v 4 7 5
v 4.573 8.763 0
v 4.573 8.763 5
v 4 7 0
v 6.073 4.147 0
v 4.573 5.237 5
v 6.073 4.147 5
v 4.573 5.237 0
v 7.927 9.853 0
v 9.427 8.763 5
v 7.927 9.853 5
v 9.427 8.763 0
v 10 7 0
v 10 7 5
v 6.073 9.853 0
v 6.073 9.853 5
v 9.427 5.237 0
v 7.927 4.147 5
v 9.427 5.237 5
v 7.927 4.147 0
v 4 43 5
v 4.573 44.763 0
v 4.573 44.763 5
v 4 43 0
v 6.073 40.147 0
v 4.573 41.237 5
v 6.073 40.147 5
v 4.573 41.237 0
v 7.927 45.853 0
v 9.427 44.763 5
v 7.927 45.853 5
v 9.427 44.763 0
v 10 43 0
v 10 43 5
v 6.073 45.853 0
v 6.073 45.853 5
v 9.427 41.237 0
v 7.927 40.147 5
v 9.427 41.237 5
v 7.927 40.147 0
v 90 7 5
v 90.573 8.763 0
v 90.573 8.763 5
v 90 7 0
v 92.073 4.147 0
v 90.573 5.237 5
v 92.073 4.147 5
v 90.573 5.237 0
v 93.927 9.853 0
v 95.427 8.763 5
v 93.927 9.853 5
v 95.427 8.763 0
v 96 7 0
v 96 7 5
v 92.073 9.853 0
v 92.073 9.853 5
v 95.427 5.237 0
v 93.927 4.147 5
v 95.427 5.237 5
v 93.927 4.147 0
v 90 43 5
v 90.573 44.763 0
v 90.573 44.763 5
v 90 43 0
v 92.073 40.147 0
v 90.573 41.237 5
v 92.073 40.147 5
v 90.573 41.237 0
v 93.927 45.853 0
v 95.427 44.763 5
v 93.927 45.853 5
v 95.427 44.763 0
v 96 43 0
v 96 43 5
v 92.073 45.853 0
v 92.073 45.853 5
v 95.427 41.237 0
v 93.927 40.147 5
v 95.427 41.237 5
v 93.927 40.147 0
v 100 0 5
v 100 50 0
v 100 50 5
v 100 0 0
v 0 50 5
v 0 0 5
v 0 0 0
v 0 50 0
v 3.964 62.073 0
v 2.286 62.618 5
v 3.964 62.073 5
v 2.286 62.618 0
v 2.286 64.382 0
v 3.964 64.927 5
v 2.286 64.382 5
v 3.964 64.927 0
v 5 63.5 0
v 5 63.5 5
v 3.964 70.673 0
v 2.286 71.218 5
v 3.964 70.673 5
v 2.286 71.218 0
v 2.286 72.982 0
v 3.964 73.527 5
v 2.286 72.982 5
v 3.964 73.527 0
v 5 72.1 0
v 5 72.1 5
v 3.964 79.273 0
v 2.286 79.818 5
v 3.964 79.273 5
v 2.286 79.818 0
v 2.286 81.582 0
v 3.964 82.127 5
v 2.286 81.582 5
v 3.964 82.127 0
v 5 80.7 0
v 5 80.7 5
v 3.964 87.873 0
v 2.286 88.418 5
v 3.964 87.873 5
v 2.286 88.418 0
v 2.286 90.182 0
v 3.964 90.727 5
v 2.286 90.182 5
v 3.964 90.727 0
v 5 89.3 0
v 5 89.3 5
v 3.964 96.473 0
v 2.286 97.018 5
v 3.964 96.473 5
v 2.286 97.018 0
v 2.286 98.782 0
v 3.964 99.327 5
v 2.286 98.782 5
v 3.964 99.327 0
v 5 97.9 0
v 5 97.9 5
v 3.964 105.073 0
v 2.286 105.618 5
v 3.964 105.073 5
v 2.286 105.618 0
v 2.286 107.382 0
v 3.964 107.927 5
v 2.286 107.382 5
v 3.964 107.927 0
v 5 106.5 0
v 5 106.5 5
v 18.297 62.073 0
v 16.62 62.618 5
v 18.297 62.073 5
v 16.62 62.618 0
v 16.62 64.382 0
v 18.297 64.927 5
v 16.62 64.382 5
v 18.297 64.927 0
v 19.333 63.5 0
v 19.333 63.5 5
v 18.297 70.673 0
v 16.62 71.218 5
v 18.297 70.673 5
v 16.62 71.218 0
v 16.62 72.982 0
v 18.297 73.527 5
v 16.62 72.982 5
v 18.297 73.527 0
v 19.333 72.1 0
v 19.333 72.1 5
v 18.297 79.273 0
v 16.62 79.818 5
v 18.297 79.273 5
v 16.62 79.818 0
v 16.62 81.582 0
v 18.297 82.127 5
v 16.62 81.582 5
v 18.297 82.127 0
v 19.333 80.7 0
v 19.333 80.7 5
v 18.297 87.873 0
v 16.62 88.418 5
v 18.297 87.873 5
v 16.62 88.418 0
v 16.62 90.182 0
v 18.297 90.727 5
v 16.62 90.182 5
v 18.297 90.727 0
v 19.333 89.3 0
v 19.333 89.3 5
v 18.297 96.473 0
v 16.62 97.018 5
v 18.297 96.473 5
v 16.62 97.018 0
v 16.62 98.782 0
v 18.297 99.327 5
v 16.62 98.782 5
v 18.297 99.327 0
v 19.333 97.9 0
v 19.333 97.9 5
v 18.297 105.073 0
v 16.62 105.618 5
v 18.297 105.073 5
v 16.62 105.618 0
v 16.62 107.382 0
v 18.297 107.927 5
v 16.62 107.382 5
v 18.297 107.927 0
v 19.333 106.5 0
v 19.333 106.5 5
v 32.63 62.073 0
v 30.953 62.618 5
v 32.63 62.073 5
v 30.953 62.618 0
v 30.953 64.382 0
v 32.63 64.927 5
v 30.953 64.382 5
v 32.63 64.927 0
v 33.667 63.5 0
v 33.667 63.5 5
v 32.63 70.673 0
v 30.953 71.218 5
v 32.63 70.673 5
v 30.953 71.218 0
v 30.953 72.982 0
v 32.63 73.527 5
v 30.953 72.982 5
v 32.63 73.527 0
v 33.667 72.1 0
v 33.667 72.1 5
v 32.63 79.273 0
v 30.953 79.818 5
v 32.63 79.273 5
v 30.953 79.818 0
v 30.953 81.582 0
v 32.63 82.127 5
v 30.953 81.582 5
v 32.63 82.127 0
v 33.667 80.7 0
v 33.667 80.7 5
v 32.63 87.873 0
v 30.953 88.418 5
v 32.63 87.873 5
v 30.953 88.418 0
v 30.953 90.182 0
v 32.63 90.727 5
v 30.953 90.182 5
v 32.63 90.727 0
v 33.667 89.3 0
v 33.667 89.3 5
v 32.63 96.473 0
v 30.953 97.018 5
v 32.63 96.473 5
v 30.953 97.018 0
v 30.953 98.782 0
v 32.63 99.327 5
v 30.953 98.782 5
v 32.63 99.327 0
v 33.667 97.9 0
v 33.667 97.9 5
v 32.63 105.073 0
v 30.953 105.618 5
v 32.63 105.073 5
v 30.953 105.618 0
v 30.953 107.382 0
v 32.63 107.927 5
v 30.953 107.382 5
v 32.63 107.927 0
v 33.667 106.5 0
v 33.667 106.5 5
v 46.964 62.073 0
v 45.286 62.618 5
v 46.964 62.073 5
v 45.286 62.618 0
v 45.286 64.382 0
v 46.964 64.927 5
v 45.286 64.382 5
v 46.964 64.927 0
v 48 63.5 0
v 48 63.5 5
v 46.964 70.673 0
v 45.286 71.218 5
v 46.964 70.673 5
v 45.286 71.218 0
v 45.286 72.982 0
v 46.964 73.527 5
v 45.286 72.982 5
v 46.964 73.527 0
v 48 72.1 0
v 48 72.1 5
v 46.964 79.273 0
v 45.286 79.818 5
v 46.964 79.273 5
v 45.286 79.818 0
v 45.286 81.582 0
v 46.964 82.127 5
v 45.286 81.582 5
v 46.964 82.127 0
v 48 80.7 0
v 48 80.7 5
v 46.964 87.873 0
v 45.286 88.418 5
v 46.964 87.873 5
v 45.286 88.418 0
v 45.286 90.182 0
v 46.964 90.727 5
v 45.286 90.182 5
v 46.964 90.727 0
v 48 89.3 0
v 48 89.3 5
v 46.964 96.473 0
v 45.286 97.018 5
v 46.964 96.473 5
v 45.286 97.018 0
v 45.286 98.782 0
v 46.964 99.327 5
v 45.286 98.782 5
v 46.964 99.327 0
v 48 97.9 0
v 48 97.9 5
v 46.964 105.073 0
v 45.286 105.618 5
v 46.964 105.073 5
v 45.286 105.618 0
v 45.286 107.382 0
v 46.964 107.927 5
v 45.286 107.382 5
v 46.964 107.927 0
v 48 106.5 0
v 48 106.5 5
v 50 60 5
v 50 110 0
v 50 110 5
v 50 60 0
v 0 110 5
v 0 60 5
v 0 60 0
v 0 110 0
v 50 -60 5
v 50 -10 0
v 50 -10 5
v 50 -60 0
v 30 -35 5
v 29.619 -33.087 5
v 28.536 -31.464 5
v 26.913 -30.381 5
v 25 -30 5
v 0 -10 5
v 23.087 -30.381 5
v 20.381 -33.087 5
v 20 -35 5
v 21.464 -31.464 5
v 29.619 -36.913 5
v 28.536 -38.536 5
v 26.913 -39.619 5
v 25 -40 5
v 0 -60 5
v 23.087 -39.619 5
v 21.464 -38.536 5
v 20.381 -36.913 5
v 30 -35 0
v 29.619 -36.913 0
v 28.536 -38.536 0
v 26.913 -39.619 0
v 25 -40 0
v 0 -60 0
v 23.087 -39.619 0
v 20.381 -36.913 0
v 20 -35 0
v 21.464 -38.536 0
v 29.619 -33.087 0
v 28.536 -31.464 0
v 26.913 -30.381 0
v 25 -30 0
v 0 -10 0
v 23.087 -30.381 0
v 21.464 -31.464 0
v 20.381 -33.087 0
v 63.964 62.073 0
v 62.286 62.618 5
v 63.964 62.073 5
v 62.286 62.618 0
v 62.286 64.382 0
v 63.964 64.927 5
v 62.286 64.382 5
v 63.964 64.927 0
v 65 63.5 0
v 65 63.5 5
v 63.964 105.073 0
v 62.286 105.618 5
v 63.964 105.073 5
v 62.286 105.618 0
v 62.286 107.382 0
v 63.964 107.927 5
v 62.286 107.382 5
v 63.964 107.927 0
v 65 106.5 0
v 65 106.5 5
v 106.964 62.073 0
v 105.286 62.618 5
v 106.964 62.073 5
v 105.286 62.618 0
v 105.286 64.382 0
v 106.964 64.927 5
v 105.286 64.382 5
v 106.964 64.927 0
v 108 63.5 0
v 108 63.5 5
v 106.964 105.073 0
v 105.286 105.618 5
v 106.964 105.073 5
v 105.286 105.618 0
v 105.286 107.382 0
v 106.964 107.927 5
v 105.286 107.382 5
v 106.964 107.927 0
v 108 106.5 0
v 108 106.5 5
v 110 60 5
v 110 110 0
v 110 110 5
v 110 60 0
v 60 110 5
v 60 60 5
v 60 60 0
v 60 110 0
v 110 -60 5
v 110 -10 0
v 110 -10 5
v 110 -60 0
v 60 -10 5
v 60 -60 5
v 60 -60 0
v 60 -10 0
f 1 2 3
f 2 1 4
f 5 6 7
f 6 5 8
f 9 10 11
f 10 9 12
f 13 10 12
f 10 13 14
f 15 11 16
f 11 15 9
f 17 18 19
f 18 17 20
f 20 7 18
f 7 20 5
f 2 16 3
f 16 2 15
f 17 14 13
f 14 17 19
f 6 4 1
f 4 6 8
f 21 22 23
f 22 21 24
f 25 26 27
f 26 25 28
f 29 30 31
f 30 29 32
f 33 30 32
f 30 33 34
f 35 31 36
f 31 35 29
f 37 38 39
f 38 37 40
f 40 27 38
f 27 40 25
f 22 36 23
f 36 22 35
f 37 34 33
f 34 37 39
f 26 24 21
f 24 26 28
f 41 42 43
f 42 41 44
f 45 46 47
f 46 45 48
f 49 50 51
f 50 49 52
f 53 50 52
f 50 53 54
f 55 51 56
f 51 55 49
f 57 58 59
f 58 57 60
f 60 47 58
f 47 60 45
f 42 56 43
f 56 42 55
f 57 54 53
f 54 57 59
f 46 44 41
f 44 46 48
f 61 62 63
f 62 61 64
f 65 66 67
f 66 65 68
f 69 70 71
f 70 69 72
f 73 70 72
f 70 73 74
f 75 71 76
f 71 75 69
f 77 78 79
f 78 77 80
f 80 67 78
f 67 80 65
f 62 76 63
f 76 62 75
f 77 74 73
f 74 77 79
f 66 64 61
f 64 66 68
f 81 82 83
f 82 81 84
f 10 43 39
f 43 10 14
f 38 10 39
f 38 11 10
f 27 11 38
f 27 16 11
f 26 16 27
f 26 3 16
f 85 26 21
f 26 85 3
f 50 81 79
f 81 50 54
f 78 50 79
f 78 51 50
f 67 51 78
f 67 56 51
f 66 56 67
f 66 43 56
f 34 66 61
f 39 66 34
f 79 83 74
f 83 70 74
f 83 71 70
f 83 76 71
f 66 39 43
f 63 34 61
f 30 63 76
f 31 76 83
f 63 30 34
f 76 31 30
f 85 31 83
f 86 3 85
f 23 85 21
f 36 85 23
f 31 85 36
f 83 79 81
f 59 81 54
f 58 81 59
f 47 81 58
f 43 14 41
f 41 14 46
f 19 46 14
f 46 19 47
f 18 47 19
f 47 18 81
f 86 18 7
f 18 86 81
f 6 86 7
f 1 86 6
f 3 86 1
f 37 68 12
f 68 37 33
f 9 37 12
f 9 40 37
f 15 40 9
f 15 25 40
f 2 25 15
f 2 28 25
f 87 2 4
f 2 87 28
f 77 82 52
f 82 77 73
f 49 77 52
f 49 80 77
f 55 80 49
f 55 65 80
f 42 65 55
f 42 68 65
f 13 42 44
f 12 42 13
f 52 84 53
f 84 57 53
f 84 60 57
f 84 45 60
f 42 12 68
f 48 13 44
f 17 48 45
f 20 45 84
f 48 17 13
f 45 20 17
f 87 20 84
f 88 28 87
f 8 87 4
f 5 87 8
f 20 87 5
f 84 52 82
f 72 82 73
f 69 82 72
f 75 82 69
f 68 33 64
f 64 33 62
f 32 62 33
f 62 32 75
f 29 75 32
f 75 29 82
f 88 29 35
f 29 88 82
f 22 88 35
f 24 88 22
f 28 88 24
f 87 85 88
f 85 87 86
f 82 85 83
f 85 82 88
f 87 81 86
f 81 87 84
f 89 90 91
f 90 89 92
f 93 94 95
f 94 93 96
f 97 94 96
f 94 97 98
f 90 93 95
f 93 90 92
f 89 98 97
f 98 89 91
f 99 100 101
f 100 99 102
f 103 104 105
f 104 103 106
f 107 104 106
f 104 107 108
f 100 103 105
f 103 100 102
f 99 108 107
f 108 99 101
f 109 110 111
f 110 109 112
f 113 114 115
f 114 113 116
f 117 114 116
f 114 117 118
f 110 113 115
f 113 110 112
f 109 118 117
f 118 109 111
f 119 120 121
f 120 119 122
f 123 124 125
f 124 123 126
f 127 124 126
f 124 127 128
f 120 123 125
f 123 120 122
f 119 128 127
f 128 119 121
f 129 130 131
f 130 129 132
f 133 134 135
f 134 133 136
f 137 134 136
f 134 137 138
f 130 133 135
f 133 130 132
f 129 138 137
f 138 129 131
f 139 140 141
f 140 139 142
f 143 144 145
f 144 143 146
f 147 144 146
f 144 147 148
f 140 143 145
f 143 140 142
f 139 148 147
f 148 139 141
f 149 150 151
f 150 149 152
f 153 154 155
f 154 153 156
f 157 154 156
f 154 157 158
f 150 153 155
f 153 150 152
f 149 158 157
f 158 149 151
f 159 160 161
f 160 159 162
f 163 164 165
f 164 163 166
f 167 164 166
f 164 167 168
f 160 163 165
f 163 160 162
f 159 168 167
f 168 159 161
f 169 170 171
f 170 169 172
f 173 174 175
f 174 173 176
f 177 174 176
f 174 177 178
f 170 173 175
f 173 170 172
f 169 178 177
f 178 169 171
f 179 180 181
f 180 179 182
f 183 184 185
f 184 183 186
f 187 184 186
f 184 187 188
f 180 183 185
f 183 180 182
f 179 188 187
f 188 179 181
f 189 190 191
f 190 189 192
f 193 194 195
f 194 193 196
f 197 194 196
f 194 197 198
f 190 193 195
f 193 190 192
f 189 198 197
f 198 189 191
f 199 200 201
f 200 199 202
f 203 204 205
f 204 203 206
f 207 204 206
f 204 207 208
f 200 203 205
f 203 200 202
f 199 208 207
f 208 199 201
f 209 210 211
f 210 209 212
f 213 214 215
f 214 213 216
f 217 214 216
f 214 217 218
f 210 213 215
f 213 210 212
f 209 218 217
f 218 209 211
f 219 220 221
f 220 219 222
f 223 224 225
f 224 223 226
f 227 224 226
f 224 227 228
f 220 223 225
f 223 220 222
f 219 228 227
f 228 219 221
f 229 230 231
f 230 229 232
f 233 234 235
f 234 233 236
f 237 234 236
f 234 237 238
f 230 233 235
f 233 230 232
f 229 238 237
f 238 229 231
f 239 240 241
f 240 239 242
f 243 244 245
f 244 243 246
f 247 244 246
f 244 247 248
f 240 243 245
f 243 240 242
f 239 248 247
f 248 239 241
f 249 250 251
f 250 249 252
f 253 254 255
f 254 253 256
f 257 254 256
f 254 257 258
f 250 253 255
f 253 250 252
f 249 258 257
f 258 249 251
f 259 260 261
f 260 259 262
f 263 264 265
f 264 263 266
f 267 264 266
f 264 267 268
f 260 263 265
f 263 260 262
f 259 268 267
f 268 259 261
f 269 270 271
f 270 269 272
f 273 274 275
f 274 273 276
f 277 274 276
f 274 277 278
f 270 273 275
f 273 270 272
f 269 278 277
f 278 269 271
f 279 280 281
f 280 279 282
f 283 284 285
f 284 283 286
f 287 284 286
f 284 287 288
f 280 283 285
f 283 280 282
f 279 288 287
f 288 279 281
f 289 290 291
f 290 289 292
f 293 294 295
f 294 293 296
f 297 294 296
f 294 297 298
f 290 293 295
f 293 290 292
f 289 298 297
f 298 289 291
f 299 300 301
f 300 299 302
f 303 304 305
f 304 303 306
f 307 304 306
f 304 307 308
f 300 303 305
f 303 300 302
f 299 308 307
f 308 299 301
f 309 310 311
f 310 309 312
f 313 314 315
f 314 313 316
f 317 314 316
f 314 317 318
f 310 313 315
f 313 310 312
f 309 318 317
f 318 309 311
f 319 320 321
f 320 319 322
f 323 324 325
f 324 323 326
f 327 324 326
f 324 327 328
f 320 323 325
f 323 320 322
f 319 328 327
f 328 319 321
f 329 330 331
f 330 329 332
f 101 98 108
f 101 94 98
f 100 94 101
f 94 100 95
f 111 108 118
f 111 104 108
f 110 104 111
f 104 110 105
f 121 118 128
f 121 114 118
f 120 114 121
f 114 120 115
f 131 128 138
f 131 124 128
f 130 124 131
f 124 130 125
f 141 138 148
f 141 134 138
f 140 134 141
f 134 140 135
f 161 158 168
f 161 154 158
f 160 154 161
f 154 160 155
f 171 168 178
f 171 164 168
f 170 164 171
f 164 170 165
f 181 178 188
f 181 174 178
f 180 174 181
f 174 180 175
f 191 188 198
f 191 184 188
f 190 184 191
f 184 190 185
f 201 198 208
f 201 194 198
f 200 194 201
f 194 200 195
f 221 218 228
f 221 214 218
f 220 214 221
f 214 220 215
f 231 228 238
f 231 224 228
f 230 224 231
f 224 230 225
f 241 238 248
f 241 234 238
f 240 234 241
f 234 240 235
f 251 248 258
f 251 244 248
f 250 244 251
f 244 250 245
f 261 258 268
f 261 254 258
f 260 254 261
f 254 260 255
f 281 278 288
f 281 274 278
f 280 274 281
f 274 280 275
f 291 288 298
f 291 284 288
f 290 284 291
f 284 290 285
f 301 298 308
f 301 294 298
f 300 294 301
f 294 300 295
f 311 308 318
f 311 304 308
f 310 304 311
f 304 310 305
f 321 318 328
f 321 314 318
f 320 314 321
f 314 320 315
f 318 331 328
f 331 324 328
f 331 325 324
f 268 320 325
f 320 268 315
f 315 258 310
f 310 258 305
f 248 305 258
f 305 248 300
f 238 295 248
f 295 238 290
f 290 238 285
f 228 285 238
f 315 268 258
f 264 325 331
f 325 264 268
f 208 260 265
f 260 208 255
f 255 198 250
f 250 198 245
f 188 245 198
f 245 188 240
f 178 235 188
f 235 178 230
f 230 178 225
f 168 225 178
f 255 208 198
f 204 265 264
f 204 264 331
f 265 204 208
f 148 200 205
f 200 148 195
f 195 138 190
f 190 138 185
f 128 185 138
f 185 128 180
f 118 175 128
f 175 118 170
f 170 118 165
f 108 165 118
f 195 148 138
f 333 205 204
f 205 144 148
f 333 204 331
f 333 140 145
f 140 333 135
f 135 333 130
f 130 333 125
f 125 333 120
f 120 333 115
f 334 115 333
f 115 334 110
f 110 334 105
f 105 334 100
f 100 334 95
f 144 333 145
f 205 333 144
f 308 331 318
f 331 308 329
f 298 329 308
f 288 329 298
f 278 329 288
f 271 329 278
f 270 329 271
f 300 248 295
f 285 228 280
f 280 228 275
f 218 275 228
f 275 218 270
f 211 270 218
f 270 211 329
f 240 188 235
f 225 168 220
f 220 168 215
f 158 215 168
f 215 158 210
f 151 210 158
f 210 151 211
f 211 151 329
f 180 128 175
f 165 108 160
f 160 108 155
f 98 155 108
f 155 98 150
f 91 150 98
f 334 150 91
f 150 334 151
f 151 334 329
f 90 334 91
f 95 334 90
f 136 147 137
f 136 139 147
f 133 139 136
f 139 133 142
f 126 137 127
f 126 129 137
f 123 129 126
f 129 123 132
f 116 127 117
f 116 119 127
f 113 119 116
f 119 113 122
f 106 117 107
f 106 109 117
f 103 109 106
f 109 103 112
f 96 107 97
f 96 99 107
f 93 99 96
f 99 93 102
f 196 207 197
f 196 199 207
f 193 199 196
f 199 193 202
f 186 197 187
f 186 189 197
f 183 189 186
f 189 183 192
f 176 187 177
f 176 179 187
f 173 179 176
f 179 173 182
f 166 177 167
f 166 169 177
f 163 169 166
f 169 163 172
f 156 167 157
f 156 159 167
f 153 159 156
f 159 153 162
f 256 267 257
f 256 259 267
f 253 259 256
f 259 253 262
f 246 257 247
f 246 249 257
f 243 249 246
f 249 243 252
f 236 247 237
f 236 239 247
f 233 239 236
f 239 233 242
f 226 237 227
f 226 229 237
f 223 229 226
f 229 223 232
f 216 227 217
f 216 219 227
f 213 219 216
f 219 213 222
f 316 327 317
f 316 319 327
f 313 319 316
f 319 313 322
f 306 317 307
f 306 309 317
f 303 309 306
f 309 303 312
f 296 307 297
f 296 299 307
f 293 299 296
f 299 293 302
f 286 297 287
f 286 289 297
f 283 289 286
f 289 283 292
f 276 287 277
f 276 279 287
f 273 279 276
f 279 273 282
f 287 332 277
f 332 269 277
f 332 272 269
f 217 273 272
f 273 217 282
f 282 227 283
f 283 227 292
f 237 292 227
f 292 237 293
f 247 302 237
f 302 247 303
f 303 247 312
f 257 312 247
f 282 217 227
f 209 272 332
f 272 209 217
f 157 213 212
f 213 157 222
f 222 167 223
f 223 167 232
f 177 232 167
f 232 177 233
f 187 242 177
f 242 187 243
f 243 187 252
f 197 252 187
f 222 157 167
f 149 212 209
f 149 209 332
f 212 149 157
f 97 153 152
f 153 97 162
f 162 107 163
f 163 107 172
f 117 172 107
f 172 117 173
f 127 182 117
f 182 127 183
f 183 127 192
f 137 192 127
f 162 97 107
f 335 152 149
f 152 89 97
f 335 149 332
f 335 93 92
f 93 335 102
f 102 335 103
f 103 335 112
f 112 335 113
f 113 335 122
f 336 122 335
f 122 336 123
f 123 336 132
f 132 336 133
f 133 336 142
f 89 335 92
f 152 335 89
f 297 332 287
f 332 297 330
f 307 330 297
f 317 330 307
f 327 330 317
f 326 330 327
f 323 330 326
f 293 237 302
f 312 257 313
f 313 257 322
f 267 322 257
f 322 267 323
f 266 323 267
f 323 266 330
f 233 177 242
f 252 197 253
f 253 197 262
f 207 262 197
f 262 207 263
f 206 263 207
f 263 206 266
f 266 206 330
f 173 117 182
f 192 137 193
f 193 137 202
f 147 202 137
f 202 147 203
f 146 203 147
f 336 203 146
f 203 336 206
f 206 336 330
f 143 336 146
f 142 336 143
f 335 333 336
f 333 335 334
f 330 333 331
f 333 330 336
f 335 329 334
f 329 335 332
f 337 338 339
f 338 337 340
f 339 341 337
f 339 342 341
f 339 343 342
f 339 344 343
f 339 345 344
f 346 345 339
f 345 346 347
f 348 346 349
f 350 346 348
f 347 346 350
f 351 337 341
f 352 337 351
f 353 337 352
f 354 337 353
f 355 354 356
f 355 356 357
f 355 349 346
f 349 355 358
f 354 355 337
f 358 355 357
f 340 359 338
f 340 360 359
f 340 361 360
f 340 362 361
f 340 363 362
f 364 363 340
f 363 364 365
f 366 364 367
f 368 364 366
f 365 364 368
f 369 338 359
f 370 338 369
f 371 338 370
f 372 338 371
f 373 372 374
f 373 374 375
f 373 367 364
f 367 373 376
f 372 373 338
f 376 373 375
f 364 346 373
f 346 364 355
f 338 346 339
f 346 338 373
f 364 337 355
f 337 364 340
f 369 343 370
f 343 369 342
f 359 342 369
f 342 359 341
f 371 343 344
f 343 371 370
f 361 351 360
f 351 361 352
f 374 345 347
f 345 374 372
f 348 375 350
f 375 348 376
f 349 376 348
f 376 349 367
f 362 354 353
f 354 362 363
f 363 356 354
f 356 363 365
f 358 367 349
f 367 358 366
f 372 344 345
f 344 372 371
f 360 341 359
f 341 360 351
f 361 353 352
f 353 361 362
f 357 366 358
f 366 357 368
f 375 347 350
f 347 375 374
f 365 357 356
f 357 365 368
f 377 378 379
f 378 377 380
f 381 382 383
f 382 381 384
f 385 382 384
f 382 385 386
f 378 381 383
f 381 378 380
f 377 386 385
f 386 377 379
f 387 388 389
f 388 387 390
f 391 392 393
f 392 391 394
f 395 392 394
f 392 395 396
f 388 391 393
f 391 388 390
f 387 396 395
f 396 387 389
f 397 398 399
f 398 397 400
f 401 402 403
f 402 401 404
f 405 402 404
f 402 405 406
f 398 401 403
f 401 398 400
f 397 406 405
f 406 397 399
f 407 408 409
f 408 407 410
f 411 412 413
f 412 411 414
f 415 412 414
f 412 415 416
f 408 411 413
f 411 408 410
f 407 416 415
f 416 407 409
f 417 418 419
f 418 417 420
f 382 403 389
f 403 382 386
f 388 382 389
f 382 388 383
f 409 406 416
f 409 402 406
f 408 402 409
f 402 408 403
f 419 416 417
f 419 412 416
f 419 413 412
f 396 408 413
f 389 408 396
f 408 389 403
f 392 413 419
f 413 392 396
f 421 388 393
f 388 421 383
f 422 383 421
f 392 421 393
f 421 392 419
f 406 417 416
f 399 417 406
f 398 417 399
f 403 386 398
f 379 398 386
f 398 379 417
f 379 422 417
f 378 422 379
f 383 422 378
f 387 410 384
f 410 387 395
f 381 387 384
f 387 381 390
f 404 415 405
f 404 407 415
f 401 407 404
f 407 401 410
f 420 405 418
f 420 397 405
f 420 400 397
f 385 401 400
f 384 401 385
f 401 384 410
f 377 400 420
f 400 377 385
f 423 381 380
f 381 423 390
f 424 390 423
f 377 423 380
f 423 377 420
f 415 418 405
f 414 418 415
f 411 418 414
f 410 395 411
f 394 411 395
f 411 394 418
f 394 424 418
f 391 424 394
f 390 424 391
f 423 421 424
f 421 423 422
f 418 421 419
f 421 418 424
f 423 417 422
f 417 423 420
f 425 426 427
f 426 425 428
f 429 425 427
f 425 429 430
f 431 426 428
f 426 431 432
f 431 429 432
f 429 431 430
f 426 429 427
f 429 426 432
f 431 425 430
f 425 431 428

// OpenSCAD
// file: hole_plate.scad
module hole_plate( size, hole_dm, hole_margin, hole_count = [2,2] ) {
    delta = 2;
    s_delta = 0.1;
    if (hole_count.x == 0 || hole_count.y == 0) {
        cube( size );
    } else {
        difference() {
            cube( size );

            abs_margin = hole_margin + hole_dm/2;
            x_hole_dist = hole_count.x > 1 ? (size.x - 2*abs_margin) / (hole_count.x - 1) : 0;
            y_hole_dist = hole_count.y > 1 ? (size.y - 2*abs_margin) / (hole_count.y - 1) : 0;

            x_values = hole_count.x > 1 ?
                [abs_margin : x_hole_dist : size.x - abs_margin + s_delta] :
                [size.x / 2];
            y_values = hole_count.y > 1 ?
                [abs_margin : y_hole_dist : size.y - abs_margin + s_delta] :
                [size.y / 2];

            // holes
            for (x = x_values, y = y_values)
                translate([x, y, -delta/2])
                color("red")
                cylinder( d = hole_dm, h = size.z + delta);
        }
    }
}
// main file
/*
This is an OpenSCAD test project

https://mastering-openscad.eu/buch/basic_ops_and_structure/
*/

/*
adjustment = 0.7;
adjustment_factor = 1.05;
function adjust(x) = (x + adjustment) * adjustment_factor;

radius_with_a_name = adjust(10);    // a very important radius
sphere(r= radius_with_a_name);
*/

// cube(size=10, center = true);


// translate([20,0,0])
//     rotate([0,0,45])
//     cube(size=10, center=true);

// dimensions in millimeter [width, depth, height] ala [x,y,z]
// plate = [100,50,5];

// hole_dm = 6;
// hole_margin = 4;

// difference() {
//     cube(plate);

//     translate
//     ([
//         hole_margin + hole_dm /2,
//         hole_margin + hole_dm /2,
//         0
//     ])
//     color("red")
//     cylinder ( d = hole_dm, h = plate.z + 0.0005);
// }

// include <hole_plate.scad>;
use <hole_plate.scad>;


hole_plate( size = [100, 50, 5], hole_dm = 6, hole_margin = 4);

translate([0,60,0])
    hole_plate(
        size = [50, 50, 5],
        hole_dm = 3,
        hole_margin = 2,
        hole_count = [4, 6]
    );

translate([0,-60,0])
    hole_plate(
        size = [50, 50, 5],
        hole_dm = 10,
        hole_margin = 2,
        hole_count = [1, 1]
    );

translate([60,-60,0])
    hole_plate(
        size = [50, 50, 5],
        hole_dm = 10,
        hole_margin = 2,
        hole_count = [0, 0]
    );

translate([60,60,0])
    hole_plate( size = [50, 50, 5], hole_dm = 3, hole_margin = 2);



/*
// dimensions in mm [width, depth, height]
plate = [100,50,5];

hole_margin = 4;
hole_dm     = 6;
abs_margin = hole_margin + hole_dm/2;

difference() {
    cube (plate);

    // x_values = [abs_margin, plate.x - abs_margin];
    // y_values = [abs_margin, plate.y - abs_margin];

    // // holes
    // for(x = x_values, y = y_values)
    //     translate( [x, y, delta/2])
    //     color("red")
    //     cylinder(d=hole_dm, h = plate.z + delta);

    //             100  - ( 2 * 7 ) => 86
    x_hole_dist = plate.x - 2 * abs_margin;
    //              50  - ( 2 * 7 ) => 36
    y_hole_dist = plate.y - 2 * abs_margin;

    //              7 : 86 : 93 => [7, 93]
    x_values = [abs_margin : x_hole_dist : plate.x - abs_margin ];
    //              7 : 36 : 43 => [7, 43]
    y_values = [abs_margin : y_hole_dist : plate.y - abs_margin ];

    // holes
    for (x = x_values, y = y_values)
        translate( [x, y, -delta/2])
        color("red")
        cylinder( d = hole_dm, h = plate.z + delta);
}
*/

// The long way
// difference() {

//     cube( plate );

//     // Lower left hole
//     translate
//     ([
//         abs_margin,
//         abs_margin,
//         -delta / 2
//     ])
//     color( "red" )
//     cylinder( d = hole_dm, h = plate.z + delta);

//     // Lower right hole
//     translate
//     ([
//         plate.x - abs_margin,
//         abs_margin,
//         -delta / 2
//     ])
//     color( "red" )
//     cylinder( d = hole_dm, h = plate.z + delta);

//     // Upper left hole
//     translate
//     ([
//         abs_margin,
//         plate.y - abs_margin,
//         -delta / 2
//     ])
//     color( "red" )
//     cylinder( d = hole_dm, h = plate.z + delta);

//     // Upper right hole
//     translate
//     ([
//         plate.x - abs_margin,
//         plate.y - abs_margin,
//         -delta / 2
//     ])
//     color( "red" )
//     cylinder( d = hole_dm, h = plate.z + delta);
// }
